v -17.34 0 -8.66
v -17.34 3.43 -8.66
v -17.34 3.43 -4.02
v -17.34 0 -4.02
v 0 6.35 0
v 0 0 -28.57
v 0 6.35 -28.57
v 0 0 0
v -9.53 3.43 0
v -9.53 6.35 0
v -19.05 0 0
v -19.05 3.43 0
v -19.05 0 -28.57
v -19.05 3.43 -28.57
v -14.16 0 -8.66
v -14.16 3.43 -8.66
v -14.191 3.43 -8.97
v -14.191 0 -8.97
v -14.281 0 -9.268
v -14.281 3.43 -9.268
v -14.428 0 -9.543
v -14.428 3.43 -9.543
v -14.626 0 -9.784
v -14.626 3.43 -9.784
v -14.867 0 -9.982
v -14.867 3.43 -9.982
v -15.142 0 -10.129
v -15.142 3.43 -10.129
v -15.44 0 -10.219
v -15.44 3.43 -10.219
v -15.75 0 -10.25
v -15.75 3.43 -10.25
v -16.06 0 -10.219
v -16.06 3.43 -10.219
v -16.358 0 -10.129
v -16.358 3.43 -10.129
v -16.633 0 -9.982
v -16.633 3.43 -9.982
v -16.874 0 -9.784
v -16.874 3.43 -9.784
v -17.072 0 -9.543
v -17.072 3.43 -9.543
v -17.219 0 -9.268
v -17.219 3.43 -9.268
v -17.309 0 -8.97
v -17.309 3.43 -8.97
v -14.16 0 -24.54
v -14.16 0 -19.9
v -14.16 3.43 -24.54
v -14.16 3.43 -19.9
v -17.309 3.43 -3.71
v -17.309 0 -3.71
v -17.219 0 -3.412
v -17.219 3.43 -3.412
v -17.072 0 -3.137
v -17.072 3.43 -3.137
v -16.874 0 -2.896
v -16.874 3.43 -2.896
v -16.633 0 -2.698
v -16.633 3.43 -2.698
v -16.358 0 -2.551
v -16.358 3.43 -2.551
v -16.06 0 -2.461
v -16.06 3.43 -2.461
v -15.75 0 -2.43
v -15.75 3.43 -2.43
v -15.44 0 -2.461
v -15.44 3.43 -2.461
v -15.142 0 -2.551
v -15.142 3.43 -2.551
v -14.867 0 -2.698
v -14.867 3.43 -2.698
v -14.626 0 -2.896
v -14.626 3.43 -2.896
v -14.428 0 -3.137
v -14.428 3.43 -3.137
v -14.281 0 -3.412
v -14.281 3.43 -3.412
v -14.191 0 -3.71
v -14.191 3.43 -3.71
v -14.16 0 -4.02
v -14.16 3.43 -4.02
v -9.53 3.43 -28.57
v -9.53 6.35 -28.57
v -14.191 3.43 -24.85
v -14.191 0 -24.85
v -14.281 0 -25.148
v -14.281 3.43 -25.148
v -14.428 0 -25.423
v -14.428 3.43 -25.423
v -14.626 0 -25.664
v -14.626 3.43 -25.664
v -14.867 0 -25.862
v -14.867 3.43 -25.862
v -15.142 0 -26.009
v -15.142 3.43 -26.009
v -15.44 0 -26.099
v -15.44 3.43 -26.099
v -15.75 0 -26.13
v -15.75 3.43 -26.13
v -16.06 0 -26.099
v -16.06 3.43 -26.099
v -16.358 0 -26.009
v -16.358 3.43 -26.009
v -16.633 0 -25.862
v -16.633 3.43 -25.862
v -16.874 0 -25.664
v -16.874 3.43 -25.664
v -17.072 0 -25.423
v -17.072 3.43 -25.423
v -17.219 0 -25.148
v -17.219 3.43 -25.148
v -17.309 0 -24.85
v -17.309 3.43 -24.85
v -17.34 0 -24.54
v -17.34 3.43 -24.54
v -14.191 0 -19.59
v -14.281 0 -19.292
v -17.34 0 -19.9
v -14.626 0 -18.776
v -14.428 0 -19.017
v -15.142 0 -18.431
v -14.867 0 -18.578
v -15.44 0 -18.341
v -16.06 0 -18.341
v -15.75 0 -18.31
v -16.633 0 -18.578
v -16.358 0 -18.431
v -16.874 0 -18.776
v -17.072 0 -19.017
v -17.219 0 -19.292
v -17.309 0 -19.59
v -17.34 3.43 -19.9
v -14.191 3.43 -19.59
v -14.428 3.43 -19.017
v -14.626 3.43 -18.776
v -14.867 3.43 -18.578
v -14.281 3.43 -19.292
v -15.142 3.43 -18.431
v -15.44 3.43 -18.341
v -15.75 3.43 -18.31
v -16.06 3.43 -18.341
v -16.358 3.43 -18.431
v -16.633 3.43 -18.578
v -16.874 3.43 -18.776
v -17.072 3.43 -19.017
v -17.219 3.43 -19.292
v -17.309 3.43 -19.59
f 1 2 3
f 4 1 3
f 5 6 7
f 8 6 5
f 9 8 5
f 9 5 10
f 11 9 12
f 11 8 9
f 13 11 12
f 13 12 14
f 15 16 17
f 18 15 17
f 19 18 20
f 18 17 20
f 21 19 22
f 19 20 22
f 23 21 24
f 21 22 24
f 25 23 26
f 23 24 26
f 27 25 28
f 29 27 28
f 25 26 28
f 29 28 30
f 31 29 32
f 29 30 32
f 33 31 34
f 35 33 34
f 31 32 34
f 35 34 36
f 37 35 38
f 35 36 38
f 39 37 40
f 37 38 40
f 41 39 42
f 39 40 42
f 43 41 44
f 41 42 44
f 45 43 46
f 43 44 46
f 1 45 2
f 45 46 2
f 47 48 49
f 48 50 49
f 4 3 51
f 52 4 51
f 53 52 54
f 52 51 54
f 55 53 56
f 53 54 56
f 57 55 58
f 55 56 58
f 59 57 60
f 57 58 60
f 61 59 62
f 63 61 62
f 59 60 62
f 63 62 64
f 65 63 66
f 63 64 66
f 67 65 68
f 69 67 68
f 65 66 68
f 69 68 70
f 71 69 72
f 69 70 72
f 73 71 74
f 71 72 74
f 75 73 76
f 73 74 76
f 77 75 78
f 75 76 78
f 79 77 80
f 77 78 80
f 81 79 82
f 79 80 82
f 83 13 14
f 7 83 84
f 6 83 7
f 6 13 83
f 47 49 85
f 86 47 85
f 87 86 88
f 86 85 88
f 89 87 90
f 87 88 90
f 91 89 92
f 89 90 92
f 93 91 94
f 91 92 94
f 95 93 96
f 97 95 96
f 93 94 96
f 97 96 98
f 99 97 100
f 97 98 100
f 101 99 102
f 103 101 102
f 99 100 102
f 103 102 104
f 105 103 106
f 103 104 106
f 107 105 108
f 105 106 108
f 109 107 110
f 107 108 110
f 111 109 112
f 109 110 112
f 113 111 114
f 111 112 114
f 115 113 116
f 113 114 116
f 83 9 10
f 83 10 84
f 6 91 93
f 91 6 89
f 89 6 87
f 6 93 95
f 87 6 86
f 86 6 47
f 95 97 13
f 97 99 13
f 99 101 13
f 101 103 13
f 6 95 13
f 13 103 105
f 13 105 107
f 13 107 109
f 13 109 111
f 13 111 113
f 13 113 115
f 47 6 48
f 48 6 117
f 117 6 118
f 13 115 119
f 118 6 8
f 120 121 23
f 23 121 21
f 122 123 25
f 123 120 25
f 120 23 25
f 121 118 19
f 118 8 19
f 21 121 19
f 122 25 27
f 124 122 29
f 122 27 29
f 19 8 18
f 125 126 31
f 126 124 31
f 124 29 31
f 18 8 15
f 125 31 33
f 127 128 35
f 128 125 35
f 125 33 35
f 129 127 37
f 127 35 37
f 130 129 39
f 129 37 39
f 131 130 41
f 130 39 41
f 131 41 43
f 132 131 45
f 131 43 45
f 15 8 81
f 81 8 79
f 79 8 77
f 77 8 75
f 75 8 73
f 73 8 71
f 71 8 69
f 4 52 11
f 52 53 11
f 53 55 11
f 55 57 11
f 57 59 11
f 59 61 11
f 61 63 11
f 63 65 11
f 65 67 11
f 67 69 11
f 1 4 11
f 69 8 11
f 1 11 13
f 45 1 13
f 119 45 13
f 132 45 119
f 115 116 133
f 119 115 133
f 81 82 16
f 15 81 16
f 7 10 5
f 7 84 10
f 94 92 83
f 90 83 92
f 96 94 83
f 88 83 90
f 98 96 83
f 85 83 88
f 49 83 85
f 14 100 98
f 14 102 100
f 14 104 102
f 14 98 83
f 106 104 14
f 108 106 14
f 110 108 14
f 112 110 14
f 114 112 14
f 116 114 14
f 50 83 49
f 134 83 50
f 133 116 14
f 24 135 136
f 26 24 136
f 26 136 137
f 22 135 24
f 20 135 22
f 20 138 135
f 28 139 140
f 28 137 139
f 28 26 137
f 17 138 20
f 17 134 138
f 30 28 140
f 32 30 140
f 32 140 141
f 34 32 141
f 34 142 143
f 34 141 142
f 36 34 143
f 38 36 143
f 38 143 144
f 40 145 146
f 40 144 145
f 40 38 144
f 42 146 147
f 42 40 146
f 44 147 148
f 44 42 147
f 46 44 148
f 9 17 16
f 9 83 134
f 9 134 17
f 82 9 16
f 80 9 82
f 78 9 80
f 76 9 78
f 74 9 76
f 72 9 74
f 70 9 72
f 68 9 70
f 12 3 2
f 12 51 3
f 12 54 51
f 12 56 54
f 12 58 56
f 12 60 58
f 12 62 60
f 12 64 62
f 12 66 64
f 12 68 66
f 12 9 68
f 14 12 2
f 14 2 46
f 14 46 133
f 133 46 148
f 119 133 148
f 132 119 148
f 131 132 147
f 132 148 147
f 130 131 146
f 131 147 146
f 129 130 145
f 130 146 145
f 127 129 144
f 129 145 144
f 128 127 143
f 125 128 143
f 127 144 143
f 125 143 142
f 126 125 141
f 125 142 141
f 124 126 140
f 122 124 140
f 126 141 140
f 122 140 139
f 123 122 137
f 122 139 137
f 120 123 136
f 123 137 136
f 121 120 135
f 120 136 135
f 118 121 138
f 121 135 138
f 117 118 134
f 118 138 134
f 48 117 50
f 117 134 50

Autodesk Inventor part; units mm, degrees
ref_plane "YZ Plane" through (0, 0, 0) normal (1, 0, 0) x (0, 1, 0)
ref_plane "XZ Plane" through (0, 0, 0) normal (0, 1, 0) x (-1, 0, 0)
ref_plane "XY Plane" through (0, 0, 0) normal (0, 0, 1) x (1, 0, 0)
sketch "Sketch1" plane through (0, 0, 0) normal (0, 1, 0) x (-1, 0, 0)
  line L0 (0, 0) -> (19.05, 0)
  line L1 (19.05, 0) -> (19.05, -28.57)
  line L2 (19.05, -28.57) -> (0, -28.57)
  line L3 (0, -28.57) -> (0, 0)
  dimension "d0" = 19.05
  dimension "d1" = 28.57
extrude "Extrusion1" add sketch "Sketch1" along normal blind 3.43
sketch "Sketch2" plane through (0, 3.43, 0) normal (0, 1, 0) x (1, 0, 0)
  line L0 (0, 28.57) -> (-19.05, 28.57) projected
  line L1 (0, 0) -> (-9.53, 0)
  line L2 (-9.53, 0) -> (-9.53, 28.57)
  line L3 (-9.53, 28.57) -> (0, 28.57)
  line L4 (0, 28.57) -> (0, 0)
  dimension "d4" = 9.53
extrude "Extrusion2" add sketch "Sketch2" along normal blind 2.92
sketch "Sketch3" plane through (0, 6.35, 0) normal (0, 1, 0) x (1, 0, 0)
  line L0 (-15.75, 4.02) -> (-15.75, 8.66) construction
  line L1 (-14.16, 4.02) -> (-14.16, 8.66)
  line L2 (-17.34, 8.66) -> (-17.34, 4.02)
  arc A0 (-17.34, 4.02) -> (-14.16, 4.02) centre (-15.75, 4.02) ccw
  arc A1 (-14.16, 8.66) -> (-17.34, 8.66) centre (-15.75, 8.66) ccw
  line L3 (-19.05, 28.57) -> (-19.05, 0) projected
  line L4 (-15.75, 19.9) -> (-15.75, 24.54) construction
  line L5 (-14.16, 19.9) -> (-14.16, 24.54)
  line L6 (-17.34, 24.54) -> (-17.34, 19.9)
  arc A2 (-17.34, 19.9) -> (-14.16, 19.9) centre (-15.75, 19.9) ccw
  arc A3 (-14.16, 24.54) -> (-17.34, 24.54) centre (-15.75, 24.54) ccw
  line L7 (0, 28.57) -> (-9.53, 28.57) projected
  point P0 (0, 0)
  point P1 (-15.75, 6.34)
  point P2 (-15.75, 22.22)
  dimension "d7" = 4.64
  dimension "d8" = 3.18
  dimension "d9" = 3.3
  dimension "d10" = 4.64
  dimension "d11" = 3.18
  dimension "d12" = 15.88
  dimension "d13" = 6.35
  dimension "d16" = 3.3
extrude "Extrusion3" cut sketch "Sketch3" against normal through all
properties part number "59145_Actuator"
